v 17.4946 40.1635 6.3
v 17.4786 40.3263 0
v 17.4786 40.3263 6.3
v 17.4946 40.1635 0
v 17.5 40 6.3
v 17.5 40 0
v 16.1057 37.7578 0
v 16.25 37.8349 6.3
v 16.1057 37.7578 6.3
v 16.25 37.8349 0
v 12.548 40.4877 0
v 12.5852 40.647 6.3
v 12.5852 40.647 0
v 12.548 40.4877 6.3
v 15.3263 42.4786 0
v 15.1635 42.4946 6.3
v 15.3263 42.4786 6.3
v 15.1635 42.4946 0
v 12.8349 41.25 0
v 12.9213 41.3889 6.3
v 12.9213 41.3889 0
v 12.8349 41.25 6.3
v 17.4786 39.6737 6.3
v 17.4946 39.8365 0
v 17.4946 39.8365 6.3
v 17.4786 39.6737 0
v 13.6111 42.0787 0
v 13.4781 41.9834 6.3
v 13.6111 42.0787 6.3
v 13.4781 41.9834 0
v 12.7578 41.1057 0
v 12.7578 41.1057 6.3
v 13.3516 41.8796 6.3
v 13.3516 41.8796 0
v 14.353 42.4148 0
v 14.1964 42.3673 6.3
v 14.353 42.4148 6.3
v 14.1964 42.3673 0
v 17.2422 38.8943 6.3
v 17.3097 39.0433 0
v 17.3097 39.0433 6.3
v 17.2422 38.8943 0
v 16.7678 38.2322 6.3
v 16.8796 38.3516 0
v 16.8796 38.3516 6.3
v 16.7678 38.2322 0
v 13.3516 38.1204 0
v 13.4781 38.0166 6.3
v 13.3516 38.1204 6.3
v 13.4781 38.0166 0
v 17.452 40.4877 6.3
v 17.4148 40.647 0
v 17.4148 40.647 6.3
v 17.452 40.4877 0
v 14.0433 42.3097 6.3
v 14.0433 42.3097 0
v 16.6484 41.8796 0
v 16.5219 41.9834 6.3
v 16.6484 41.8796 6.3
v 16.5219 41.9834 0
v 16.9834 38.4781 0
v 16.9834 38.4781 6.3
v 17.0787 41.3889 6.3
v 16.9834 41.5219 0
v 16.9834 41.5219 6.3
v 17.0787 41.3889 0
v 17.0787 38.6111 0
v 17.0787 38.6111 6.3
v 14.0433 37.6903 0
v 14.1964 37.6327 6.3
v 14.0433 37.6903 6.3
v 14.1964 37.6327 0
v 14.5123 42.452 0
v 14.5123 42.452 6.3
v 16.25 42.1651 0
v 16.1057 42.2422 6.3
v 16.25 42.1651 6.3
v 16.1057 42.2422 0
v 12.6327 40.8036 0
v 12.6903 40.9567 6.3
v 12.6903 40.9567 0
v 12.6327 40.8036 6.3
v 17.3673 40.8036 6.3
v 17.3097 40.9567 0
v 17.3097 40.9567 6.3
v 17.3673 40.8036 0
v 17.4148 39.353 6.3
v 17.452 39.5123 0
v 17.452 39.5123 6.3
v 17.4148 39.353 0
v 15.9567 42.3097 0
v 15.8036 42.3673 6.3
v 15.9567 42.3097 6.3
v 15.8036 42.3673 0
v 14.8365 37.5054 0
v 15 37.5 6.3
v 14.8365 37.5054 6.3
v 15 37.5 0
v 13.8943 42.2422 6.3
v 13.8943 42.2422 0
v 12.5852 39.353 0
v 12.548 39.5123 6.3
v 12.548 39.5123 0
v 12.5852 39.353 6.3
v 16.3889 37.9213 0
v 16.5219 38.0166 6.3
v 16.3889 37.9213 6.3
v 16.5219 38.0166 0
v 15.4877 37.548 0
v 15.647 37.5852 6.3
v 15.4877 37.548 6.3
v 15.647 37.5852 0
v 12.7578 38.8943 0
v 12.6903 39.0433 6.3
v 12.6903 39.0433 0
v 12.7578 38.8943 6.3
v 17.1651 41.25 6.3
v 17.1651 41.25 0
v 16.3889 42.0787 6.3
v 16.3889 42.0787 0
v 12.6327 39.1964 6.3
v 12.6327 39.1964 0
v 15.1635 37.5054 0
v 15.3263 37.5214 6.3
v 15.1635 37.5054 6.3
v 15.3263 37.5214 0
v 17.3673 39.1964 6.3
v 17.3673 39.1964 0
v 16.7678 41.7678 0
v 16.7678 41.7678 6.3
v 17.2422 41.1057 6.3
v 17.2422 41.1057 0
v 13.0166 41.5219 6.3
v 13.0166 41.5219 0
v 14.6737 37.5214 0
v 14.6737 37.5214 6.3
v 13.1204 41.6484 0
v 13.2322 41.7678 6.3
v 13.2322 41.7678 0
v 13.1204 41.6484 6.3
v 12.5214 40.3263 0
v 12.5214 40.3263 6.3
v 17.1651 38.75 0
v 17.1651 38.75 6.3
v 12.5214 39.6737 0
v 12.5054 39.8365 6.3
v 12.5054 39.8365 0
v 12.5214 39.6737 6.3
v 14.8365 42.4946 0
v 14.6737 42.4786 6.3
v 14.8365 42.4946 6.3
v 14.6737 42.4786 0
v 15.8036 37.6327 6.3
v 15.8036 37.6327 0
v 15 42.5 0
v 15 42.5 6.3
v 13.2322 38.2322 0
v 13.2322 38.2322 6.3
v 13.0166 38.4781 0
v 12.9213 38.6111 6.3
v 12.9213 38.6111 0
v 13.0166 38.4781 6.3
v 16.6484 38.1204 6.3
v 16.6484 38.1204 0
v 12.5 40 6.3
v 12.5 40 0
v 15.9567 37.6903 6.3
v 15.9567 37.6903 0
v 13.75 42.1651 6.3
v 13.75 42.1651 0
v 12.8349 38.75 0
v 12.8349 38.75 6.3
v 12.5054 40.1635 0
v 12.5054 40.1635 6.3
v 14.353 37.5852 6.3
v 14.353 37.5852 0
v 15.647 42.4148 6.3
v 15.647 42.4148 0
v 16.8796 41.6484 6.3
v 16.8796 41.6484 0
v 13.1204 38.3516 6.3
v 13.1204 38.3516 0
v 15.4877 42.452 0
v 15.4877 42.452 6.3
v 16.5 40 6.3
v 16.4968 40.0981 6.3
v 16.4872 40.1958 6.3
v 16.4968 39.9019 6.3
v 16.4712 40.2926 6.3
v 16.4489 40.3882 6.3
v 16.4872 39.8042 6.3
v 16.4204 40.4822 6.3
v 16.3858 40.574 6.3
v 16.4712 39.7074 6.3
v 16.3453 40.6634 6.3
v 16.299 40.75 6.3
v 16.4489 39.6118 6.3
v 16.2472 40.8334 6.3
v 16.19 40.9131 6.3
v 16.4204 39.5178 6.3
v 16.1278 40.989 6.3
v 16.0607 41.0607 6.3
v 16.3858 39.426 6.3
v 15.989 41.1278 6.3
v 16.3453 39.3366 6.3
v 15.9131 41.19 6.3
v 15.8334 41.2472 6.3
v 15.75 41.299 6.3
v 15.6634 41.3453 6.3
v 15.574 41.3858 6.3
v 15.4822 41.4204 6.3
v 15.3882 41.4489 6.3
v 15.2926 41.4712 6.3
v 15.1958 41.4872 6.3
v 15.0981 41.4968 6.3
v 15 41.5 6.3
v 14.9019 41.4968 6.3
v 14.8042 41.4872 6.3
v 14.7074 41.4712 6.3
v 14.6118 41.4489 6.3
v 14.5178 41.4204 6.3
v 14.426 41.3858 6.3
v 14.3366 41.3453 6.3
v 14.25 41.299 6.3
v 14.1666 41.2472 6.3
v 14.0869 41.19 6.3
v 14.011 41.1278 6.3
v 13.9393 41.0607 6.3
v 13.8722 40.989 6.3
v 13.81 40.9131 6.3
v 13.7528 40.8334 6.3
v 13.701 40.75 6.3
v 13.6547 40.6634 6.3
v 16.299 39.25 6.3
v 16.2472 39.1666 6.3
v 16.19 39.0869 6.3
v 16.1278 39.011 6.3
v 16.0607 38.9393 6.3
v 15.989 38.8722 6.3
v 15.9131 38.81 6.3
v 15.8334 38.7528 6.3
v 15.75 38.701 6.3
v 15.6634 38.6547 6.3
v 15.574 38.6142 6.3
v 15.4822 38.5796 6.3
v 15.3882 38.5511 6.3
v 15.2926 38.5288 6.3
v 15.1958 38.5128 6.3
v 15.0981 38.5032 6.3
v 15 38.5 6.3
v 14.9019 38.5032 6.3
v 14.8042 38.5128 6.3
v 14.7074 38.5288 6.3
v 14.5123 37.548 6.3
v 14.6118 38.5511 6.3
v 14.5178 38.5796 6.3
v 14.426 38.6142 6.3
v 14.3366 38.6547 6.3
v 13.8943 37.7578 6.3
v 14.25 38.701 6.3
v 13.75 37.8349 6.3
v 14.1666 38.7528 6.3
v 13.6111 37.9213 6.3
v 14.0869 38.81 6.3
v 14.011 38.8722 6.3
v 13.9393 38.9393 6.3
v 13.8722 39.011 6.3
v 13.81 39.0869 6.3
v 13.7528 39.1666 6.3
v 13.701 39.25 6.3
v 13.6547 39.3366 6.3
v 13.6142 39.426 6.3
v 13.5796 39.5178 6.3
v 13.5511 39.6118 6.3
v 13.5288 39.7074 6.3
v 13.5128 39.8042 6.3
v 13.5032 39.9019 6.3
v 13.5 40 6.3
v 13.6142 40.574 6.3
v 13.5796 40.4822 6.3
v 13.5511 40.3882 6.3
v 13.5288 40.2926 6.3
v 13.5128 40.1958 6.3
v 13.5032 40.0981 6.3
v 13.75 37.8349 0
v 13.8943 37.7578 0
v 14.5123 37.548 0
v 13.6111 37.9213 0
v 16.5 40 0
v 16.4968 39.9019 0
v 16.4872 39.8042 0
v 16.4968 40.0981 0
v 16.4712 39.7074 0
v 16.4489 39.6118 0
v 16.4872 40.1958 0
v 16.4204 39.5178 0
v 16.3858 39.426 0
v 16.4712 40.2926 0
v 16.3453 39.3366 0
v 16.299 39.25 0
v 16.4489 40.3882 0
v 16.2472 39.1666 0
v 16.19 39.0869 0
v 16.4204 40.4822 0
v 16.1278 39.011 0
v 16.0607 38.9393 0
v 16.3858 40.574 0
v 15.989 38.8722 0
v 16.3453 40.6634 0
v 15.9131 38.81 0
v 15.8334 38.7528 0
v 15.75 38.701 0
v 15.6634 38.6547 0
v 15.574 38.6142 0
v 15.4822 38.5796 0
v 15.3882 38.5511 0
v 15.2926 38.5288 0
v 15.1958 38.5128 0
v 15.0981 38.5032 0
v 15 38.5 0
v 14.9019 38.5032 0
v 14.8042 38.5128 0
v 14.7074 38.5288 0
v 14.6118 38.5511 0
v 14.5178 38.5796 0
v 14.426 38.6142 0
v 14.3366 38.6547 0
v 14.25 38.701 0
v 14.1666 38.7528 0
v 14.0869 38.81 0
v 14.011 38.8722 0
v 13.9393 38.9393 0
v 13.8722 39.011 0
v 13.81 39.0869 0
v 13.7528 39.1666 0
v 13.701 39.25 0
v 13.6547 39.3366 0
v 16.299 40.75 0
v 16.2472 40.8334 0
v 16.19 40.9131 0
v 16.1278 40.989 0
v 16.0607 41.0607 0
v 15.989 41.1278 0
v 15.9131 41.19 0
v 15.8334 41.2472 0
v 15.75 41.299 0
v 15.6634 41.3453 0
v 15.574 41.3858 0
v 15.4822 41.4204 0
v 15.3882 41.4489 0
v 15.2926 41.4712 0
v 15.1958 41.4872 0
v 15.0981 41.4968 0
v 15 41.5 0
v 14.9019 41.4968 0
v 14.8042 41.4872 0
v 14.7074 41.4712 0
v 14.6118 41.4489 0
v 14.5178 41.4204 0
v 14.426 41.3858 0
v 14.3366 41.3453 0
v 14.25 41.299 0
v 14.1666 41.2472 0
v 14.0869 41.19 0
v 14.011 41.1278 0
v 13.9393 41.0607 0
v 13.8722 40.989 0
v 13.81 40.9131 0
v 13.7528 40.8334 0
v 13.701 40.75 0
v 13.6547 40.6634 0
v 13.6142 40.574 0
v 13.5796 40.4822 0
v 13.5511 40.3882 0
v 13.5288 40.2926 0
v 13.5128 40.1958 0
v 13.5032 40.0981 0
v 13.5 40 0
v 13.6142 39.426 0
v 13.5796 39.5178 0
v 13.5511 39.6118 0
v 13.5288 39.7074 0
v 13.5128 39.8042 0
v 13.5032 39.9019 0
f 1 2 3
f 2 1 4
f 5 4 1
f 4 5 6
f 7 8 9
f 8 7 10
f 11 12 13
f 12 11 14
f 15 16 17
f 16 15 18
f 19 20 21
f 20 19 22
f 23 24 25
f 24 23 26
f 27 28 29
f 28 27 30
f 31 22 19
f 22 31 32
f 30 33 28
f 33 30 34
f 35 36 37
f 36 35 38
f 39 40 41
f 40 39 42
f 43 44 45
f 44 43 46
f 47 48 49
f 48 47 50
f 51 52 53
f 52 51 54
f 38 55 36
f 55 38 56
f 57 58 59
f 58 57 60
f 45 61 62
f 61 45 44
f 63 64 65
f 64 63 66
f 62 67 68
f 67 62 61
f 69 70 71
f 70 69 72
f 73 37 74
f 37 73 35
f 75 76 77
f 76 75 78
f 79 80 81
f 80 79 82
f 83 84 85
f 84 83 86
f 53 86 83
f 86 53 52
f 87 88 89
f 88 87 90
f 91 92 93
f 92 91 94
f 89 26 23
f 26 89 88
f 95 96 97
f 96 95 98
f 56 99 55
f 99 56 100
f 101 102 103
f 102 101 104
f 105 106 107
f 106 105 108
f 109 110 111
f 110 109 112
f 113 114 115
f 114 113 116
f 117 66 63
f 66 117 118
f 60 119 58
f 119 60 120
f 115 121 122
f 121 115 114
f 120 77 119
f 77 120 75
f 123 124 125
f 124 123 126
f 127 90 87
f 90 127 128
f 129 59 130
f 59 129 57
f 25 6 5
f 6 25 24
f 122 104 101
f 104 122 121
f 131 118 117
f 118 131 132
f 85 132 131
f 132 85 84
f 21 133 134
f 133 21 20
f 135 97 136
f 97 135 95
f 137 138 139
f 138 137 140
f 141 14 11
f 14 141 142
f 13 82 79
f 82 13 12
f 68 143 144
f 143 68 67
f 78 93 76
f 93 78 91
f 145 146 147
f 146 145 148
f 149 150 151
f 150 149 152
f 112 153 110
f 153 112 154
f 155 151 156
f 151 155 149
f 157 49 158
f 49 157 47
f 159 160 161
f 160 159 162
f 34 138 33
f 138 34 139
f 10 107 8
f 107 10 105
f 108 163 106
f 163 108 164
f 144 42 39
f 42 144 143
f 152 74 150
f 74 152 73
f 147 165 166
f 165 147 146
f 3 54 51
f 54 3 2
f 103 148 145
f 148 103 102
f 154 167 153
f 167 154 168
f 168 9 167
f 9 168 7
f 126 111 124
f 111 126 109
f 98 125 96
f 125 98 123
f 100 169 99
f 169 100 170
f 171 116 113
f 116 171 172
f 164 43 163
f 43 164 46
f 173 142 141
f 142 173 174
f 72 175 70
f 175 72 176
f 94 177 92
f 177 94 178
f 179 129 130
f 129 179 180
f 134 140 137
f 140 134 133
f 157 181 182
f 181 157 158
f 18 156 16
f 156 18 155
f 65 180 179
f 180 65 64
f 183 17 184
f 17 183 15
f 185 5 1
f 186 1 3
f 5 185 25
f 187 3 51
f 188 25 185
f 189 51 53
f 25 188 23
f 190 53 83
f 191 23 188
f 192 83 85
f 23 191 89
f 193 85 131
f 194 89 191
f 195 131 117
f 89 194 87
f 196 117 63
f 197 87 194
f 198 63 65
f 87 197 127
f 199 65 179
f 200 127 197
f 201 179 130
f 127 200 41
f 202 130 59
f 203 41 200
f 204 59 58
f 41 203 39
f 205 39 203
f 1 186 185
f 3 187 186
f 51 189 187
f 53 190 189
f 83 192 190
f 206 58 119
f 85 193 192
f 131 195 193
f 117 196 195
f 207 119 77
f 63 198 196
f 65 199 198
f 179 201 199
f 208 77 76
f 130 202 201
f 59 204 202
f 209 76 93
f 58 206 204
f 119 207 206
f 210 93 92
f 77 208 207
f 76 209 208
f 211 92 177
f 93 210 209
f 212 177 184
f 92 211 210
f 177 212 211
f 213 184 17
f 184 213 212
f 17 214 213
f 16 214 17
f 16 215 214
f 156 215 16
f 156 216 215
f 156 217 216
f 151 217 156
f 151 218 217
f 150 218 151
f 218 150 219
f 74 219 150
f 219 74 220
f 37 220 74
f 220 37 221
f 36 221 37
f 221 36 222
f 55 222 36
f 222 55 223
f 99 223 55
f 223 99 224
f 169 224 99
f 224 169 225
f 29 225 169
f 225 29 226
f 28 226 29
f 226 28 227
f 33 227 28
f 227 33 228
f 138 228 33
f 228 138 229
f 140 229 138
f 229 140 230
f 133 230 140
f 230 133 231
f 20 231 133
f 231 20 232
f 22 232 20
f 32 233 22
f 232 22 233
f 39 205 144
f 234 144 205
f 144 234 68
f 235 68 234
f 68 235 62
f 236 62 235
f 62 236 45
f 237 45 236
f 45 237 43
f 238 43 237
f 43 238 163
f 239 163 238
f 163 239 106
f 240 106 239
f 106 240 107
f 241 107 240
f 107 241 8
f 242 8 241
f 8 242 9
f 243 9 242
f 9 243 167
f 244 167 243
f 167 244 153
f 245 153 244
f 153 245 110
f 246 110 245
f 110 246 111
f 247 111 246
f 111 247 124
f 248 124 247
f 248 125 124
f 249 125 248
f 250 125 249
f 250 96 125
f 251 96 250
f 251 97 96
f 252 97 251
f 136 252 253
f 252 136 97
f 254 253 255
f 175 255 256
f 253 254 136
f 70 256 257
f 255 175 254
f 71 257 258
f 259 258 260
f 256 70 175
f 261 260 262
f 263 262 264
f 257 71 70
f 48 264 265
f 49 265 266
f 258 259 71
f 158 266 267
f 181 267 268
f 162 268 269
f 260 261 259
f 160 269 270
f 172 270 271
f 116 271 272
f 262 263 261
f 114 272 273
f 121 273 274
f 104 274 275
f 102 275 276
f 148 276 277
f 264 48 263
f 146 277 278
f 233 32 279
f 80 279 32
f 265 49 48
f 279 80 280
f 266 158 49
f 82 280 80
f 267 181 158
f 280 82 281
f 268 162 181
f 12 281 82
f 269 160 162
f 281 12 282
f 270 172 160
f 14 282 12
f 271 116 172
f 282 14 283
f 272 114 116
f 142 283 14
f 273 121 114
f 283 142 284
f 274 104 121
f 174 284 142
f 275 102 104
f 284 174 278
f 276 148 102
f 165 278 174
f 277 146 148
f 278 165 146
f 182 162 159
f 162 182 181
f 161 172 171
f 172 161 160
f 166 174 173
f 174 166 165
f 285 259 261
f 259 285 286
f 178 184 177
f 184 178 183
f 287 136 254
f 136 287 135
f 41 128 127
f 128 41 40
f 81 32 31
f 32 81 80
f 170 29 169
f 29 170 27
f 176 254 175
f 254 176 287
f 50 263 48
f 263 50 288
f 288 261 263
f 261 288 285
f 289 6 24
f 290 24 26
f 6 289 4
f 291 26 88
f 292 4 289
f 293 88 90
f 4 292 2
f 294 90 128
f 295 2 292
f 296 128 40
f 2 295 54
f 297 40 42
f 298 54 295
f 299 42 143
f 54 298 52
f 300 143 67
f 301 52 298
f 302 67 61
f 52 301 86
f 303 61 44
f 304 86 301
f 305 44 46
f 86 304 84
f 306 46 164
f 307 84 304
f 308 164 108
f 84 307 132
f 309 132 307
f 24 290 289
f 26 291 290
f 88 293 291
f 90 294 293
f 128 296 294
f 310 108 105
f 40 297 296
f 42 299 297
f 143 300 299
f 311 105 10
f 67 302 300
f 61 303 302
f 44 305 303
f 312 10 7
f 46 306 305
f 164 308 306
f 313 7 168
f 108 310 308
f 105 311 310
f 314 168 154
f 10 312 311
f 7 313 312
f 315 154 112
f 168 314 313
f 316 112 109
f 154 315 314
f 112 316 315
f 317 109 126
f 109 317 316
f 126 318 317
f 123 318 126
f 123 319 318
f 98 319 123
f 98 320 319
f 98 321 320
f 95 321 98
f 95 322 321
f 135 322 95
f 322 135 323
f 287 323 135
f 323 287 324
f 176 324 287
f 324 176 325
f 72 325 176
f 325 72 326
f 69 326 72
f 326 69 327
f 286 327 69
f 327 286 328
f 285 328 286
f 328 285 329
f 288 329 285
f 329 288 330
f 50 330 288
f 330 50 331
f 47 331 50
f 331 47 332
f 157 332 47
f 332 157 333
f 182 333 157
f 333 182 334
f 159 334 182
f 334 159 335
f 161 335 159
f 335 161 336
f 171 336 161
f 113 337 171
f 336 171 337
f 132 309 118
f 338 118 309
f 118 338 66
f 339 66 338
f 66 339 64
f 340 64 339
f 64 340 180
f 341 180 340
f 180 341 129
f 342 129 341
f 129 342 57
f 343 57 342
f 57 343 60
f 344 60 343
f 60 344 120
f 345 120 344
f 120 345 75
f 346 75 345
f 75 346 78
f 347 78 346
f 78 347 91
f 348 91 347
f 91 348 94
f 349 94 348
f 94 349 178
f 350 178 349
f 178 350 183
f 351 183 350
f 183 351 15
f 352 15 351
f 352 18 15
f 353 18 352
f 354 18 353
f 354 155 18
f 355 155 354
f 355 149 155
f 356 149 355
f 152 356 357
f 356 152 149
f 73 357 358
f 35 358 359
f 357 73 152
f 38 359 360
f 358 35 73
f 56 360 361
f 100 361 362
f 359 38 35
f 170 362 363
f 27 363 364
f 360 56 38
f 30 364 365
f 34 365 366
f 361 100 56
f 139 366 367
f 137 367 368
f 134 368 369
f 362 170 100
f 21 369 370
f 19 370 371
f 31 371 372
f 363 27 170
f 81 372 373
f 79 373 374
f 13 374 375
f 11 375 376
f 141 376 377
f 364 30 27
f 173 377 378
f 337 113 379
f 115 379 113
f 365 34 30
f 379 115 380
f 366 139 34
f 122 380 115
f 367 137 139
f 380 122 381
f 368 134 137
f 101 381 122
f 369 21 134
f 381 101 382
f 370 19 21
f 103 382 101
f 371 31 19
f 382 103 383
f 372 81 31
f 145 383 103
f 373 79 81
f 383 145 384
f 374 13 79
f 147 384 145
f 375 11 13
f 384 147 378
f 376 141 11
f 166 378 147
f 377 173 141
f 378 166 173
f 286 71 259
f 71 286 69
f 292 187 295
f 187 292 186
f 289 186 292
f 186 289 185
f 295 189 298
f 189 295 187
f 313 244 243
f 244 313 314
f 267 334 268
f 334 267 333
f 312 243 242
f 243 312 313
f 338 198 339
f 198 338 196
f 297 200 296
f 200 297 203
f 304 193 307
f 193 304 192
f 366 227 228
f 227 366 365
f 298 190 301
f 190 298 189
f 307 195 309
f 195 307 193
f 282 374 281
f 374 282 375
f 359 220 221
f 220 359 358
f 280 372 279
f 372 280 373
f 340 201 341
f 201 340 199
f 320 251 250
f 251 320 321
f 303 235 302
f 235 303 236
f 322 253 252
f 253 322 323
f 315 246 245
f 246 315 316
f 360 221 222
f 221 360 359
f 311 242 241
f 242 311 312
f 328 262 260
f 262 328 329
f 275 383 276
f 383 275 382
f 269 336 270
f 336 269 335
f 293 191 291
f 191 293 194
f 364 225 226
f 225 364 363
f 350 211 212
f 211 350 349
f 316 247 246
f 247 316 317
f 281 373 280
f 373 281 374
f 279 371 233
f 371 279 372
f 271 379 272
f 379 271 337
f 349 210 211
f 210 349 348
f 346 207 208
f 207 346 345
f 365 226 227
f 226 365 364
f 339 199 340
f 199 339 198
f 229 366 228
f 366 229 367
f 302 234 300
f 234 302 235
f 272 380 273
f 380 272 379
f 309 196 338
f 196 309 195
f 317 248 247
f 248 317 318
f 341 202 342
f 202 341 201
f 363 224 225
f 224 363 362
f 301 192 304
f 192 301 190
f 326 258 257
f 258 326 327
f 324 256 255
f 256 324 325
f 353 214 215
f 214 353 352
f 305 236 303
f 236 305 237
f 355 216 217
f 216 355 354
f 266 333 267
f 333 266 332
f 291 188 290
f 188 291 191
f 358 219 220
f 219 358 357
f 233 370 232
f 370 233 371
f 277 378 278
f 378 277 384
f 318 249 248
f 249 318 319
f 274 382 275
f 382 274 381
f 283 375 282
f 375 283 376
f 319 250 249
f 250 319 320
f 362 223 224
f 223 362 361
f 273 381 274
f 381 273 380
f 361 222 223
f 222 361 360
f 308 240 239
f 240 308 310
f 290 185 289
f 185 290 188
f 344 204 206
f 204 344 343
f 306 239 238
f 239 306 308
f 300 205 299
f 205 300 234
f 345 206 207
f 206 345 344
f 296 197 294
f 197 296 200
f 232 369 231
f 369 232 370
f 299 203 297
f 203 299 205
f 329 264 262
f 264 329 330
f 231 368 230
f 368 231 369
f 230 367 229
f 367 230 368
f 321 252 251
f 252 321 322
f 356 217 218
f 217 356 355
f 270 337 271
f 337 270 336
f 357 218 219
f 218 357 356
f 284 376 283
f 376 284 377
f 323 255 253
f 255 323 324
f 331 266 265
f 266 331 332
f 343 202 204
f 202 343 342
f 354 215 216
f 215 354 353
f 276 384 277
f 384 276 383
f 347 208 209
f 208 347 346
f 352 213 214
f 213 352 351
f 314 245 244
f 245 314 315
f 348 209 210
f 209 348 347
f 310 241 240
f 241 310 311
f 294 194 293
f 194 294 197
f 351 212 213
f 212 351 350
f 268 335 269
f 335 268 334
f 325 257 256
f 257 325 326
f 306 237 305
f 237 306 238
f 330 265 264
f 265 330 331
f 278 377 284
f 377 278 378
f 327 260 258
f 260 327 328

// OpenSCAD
module paradize(){
	union(){
	translate([-0.005,0.38,0]) color("white") linear_extrude(height = 1.5) scale(0.15,0.15,1) import("paradize3.dxf");
	translate([0.19,0,1.4]) color("red") linear_extrude(height = 3.5) scale(0.15,0.15,1) import("paradize1.dxf");
	translate([0,0,4.8]) color("black") linear_extrude(height = 1.5) scale(0.15,0.15,1) import("paradize2.dxf");
	}
}

difference(){
	union(){
		paradize();
		translate([15,40,0]) color("yellow") cylinder(r=2.5, h=6.3, $fn=96);
	}
	translate([15,40,-2]) color("orange") cylinder(r=1.5, h=10, $fn=96);
}
